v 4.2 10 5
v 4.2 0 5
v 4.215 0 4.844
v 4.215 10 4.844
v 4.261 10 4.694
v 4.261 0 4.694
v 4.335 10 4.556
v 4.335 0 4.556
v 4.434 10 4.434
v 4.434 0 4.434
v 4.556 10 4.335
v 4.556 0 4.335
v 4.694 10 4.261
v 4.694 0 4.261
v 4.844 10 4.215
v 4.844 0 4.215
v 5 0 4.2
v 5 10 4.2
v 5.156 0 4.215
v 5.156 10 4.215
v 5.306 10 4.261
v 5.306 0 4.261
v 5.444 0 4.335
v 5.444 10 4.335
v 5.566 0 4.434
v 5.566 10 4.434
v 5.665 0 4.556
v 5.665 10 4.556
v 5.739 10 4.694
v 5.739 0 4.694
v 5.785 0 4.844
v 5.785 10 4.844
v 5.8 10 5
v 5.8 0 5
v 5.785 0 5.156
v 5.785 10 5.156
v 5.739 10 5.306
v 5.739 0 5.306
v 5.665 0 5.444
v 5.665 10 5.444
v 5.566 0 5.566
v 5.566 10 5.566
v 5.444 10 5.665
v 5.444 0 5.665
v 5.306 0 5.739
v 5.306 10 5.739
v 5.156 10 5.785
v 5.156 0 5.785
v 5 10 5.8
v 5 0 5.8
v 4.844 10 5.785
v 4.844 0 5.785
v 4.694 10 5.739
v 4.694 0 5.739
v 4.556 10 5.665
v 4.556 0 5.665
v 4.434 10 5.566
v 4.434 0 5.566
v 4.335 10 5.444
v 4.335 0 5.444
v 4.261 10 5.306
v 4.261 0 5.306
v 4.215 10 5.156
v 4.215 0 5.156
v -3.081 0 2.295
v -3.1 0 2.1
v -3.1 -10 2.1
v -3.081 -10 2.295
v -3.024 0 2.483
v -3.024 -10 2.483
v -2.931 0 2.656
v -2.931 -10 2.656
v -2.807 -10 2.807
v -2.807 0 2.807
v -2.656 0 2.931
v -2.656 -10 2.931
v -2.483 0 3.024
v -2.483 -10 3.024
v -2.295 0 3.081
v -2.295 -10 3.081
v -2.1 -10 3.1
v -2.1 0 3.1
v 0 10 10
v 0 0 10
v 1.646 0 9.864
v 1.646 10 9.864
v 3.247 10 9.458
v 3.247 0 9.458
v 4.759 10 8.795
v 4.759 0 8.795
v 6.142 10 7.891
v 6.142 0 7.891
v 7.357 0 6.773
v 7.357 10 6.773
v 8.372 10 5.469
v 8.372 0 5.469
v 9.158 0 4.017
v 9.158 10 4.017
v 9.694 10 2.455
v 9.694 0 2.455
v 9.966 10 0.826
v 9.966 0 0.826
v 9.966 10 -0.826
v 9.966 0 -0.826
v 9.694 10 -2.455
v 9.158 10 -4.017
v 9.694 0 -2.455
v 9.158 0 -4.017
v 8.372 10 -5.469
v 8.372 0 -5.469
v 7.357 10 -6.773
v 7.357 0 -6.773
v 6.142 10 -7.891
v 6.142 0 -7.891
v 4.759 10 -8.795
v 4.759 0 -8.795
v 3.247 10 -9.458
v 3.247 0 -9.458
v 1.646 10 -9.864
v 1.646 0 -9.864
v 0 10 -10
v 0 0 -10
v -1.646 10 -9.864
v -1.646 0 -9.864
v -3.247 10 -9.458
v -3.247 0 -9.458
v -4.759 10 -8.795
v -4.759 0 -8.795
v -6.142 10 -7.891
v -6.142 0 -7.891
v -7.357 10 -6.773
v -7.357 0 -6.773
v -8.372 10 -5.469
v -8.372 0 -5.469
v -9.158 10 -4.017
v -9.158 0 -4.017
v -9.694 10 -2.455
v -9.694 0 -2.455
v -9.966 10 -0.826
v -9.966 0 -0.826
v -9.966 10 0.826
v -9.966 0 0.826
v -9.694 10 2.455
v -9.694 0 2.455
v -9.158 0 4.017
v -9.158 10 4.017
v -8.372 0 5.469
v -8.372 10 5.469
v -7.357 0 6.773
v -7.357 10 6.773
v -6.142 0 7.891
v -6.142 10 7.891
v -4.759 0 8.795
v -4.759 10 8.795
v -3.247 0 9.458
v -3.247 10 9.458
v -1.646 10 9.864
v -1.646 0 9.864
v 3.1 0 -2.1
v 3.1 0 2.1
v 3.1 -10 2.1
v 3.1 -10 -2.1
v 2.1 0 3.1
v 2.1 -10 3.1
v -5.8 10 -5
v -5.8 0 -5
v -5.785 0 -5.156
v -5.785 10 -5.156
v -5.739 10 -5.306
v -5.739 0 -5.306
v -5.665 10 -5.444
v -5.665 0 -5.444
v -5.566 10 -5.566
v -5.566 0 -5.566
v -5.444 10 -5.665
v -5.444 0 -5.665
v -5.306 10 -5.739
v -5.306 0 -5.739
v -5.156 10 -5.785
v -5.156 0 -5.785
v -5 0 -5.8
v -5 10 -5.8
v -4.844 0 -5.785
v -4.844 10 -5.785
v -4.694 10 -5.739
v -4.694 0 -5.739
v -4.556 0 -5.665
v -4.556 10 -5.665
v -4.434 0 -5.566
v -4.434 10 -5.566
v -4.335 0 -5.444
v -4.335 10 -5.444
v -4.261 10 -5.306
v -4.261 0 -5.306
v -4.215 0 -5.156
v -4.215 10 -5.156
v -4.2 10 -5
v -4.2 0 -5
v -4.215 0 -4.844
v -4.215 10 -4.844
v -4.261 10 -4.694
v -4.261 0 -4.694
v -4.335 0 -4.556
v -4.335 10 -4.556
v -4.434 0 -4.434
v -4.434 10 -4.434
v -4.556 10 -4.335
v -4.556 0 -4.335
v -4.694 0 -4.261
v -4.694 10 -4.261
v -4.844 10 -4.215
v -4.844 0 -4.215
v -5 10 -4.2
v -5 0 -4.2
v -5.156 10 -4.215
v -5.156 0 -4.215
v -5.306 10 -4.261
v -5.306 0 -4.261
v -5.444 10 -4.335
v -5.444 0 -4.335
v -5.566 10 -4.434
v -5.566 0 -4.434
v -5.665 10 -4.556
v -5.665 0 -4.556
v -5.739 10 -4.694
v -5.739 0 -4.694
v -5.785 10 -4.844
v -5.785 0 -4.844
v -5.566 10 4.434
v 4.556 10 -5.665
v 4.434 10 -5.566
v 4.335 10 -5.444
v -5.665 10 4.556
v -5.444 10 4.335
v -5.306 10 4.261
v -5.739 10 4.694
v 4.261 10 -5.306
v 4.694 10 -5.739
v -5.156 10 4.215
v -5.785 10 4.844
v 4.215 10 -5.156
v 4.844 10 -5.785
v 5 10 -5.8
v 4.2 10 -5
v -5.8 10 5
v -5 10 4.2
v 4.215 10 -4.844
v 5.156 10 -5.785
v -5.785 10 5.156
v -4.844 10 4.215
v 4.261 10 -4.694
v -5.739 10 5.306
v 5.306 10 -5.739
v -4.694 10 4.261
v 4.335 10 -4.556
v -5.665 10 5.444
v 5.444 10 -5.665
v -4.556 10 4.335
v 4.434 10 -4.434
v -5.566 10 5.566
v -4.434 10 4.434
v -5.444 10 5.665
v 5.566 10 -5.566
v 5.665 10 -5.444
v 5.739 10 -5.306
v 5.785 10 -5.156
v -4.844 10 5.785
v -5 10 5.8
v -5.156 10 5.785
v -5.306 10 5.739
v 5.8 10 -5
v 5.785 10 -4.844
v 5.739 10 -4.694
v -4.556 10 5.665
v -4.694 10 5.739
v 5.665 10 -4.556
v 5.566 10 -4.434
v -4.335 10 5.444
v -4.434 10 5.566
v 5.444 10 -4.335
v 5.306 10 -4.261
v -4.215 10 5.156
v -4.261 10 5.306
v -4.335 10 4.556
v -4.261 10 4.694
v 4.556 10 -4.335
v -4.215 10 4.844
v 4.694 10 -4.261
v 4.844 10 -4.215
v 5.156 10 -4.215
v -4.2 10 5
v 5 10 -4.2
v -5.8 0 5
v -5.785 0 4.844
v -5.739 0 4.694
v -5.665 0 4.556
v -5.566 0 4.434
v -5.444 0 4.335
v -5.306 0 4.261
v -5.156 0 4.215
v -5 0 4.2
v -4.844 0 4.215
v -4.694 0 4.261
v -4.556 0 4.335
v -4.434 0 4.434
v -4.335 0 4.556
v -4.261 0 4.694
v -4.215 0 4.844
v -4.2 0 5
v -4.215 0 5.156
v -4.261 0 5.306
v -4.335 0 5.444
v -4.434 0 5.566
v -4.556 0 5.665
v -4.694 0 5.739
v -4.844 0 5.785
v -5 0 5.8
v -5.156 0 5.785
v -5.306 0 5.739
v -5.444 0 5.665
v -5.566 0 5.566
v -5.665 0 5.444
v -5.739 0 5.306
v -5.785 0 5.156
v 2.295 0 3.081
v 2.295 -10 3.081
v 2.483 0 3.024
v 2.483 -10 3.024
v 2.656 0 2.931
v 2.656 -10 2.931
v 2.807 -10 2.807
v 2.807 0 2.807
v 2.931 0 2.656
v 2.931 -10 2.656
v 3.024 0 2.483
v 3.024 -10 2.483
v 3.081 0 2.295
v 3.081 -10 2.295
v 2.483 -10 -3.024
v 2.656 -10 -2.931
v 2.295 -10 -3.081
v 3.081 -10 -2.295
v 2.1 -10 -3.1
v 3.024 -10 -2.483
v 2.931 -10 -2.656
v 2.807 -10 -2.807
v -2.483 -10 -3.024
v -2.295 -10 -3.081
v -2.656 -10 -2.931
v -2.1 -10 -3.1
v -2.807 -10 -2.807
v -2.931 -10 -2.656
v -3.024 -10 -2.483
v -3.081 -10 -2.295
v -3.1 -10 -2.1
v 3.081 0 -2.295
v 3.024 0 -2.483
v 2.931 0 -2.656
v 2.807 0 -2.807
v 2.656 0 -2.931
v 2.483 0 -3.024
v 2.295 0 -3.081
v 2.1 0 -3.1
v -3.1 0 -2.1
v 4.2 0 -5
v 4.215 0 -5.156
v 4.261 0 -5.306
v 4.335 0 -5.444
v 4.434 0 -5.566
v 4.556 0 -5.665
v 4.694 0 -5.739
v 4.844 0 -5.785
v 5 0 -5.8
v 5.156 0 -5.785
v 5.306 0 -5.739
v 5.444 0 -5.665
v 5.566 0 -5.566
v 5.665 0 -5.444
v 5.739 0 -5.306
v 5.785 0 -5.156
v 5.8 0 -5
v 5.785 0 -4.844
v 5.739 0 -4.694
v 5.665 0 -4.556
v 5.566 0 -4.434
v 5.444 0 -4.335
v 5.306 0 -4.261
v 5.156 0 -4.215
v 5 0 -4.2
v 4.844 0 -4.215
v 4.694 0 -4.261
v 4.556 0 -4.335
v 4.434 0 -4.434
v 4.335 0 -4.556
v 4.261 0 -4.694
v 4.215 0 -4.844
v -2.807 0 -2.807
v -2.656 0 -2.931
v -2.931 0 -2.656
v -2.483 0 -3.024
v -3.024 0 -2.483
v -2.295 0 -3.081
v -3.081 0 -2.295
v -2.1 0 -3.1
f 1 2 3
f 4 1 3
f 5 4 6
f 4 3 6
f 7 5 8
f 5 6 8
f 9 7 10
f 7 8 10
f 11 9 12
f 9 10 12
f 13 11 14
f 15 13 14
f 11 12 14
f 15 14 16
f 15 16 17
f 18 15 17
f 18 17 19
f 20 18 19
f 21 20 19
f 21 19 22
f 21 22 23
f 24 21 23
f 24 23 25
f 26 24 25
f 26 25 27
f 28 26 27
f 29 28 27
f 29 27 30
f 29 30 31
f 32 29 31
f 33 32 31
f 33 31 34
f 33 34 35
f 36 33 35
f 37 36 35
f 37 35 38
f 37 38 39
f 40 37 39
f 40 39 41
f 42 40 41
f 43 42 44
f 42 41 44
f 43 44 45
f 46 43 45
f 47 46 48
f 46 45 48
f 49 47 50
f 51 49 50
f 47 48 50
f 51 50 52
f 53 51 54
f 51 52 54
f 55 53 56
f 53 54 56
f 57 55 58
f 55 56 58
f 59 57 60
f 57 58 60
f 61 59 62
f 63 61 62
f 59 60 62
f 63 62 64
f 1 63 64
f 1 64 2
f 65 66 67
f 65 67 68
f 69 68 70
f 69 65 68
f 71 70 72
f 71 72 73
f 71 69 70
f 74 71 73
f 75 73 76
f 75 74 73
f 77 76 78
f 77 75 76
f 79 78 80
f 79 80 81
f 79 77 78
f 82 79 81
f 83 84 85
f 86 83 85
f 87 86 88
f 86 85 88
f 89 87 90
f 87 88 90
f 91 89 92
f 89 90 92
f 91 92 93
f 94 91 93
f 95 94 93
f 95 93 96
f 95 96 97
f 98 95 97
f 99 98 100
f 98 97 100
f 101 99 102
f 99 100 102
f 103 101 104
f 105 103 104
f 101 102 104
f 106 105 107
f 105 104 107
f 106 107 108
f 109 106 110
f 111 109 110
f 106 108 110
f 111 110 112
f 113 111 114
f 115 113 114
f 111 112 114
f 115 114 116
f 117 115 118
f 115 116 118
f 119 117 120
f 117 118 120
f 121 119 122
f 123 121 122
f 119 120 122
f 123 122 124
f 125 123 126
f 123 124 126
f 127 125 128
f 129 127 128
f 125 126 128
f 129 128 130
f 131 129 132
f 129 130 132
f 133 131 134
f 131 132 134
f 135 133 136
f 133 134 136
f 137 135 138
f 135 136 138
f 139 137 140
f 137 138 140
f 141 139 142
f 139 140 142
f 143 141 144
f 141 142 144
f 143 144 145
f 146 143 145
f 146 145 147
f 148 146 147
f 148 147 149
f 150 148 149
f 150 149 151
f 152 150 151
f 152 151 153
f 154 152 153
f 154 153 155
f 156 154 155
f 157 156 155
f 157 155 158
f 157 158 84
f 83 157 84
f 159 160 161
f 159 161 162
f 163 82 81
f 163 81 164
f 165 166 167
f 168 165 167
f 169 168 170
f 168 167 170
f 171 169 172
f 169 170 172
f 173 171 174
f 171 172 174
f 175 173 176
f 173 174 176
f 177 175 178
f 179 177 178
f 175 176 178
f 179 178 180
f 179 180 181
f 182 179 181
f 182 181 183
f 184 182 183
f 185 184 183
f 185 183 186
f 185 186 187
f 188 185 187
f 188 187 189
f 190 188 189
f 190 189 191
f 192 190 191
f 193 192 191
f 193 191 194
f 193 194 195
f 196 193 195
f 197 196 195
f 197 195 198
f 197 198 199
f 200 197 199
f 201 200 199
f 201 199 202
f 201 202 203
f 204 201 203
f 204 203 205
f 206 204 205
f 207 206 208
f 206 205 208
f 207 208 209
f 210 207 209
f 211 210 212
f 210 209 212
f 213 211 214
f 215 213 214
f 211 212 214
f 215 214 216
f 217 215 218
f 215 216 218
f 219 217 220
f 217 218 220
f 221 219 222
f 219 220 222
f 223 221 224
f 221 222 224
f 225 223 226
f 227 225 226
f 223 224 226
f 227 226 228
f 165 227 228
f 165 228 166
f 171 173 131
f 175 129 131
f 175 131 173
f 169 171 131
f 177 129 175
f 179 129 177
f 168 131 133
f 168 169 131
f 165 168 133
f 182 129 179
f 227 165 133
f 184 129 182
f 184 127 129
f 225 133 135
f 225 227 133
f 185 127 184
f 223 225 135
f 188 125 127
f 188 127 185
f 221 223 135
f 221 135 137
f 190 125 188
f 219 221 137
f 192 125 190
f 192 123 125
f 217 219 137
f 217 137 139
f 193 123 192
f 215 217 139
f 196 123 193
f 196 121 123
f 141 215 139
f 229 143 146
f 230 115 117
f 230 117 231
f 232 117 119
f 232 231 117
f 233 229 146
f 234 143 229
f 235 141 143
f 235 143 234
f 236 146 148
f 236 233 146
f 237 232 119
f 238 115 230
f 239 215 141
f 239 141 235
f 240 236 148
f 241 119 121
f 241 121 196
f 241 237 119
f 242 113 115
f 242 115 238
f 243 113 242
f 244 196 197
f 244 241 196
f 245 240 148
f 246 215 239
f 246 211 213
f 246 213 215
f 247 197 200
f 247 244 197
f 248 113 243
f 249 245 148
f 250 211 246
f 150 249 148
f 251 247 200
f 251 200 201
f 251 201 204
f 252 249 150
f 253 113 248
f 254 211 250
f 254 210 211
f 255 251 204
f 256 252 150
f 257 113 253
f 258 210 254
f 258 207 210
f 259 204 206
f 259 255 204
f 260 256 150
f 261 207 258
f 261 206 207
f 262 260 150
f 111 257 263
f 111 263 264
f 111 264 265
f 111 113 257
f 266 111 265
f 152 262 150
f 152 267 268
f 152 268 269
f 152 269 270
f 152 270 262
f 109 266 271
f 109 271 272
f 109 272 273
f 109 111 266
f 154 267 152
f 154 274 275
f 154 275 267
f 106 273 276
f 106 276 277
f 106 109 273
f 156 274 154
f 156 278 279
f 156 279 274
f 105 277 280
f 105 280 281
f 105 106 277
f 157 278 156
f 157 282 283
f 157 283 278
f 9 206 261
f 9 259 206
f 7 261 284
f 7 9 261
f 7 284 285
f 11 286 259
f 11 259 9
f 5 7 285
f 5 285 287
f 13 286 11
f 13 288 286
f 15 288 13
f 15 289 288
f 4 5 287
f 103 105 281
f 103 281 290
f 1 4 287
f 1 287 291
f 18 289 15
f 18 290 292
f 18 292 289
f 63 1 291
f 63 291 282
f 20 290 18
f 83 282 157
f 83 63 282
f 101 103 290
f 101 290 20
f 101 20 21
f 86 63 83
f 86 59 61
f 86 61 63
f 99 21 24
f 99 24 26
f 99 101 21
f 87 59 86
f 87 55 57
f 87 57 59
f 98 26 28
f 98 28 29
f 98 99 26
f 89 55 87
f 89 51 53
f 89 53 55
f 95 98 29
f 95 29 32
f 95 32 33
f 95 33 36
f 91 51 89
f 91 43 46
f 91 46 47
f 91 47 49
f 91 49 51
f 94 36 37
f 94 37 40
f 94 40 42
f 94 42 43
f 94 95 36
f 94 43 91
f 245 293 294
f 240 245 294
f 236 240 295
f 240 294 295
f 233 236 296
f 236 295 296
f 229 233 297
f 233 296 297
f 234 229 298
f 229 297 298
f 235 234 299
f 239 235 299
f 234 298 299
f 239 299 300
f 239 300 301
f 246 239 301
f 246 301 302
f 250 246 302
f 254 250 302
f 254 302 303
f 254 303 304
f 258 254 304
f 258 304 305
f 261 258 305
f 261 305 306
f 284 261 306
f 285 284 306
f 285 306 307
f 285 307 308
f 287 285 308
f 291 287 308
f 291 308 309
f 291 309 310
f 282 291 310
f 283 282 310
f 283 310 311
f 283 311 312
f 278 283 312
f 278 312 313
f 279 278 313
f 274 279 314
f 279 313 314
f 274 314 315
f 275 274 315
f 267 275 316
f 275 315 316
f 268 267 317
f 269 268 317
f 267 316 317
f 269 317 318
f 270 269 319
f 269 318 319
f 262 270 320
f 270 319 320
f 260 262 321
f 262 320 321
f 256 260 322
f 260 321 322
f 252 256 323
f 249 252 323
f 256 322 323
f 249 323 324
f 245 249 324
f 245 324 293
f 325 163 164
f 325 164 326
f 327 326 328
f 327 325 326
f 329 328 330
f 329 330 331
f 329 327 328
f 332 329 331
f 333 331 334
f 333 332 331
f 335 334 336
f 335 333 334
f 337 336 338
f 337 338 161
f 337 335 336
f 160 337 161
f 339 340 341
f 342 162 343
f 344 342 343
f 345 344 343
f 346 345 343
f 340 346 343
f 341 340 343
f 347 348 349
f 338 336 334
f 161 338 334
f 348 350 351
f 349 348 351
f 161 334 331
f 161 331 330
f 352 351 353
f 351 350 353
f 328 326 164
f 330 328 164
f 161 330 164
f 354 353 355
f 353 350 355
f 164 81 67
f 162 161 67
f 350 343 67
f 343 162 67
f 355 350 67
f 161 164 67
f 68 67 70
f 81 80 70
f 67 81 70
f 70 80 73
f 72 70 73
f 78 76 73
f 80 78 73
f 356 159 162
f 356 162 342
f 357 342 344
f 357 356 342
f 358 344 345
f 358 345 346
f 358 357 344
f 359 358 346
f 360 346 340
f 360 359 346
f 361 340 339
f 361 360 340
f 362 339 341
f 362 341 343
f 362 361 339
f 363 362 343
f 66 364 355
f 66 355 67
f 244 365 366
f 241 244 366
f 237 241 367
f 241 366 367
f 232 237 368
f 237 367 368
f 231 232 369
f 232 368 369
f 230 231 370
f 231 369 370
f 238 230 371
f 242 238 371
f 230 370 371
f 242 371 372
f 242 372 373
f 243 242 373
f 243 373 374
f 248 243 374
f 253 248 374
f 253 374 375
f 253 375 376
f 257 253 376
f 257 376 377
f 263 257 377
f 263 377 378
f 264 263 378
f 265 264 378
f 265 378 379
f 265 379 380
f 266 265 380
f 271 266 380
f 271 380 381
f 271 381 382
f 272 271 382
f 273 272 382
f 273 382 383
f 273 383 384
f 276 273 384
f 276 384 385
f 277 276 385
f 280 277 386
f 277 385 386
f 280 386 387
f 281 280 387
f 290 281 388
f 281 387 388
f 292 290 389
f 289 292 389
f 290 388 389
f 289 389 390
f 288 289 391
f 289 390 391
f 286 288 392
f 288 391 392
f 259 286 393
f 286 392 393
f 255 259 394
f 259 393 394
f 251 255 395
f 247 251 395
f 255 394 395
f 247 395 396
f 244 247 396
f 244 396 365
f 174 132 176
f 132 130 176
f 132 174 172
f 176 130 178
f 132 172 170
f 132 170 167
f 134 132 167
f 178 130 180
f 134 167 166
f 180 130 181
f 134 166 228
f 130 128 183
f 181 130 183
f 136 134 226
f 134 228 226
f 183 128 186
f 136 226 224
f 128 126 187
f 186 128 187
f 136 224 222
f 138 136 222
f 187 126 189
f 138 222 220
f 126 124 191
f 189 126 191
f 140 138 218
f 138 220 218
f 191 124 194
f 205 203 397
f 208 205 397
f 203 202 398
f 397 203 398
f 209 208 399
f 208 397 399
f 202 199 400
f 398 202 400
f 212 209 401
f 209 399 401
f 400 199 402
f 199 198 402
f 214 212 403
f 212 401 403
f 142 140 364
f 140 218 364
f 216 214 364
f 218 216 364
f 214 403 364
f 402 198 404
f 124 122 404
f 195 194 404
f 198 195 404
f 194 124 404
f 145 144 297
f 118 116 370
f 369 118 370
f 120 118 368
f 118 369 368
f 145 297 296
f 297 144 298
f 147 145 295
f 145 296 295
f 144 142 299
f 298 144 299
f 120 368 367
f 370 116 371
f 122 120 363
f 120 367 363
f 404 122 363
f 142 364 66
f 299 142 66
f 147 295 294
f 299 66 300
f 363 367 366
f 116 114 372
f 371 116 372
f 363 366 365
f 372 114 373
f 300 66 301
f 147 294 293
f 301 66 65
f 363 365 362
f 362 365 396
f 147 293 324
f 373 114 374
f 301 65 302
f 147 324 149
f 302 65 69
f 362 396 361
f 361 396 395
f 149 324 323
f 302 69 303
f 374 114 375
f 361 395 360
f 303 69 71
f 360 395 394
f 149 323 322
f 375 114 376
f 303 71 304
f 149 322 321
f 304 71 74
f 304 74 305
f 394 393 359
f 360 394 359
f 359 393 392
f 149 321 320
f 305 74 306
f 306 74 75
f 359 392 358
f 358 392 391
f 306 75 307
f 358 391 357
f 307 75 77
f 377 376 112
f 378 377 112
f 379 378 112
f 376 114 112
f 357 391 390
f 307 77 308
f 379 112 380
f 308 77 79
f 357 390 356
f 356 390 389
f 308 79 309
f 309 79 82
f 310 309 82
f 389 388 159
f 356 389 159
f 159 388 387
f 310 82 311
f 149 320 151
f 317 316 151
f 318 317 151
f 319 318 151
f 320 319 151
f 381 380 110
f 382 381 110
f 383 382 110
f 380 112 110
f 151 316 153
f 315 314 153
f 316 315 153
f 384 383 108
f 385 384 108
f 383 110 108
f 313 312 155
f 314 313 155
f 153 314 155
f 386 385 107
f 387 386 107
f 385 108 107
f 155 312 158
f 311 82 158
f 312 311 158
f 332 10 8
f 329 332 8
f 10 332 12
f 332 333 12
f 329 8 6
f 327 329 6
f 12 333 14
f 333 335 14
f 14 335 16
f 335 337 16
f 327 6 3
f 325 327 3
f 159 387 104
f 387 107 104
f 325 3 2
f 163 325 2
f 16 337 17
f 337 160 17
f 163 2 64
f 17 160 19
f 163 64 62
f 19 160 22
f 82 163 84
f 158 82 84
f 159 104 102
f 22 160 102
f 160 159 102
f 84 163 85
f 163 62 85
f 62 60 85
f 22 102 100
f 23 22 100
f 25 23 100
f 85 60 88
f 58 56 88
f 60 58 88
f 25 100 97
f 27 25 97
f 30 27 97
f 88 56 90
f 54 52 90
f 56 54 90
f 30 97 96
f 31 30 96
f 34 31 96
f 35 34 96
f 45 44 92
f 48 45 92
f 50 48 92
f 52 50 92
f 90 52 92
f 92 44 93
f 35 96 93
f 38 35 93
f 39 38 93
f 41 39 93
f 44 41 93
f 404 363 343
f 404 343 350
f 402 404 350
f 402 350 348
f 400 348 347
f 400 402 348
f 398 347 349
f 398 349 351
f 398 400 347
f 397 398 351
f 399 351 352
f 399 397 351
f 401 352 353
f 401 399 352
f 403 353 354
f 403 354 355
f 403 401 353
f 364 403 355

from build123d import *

# Parameters (mm, degrees)
SKETCH1_R             = 10
BOSS_EXTRUDE1_DEPTH   = 10
M2X0_4_TAPPED_HOLE1_D = 1.6
BOSS_EXTRUDE2_DEPTH   = 10


with BuildPart() as part:
    # Sketch1 → Boss-Extrude1 (new body)
    with BuildSketch(Plane(origin=(0, 0, 0), x_dir=(1, 0, 0), z_dir=(0, 1, 0))):
        with Locations(Location((0, 0, 0), (0, 0, 270))):
            Circle(SKETCH1_R)
    extrude(amount=BOSS_EXTRUDE1_DEPTH)

    # M2x0.4 Tapped Hole1 (through all)
    with Locations(Plane(origin=(0, 10, 0), x_dir=(1, 0, 0), z_dir=(0, 1, 0))):
        with Locations((-5, 5), (5, 5), (5, -5), (-5, -5)):
            Hole(M2X0_4_TAPPED_HOLE1_D / 2)

    # Sketch5 → Boss-Extrude2 (add)
    with BuildSketch(Plane.XZ):
        with BuildLine():
            Line((-2.1, 3.1), (2.1, 3.1))
            ThreePointArc((2.1, 3.1), (2.807106781, 2.807106781), (3.1, 2.1))
            Line((3.1, 2.1), (3.1, -2.1))
            ThreePointArc((3.1, -2.1), (2.807106781, -2.807106781), (2.1, -3.1))
            Line((2.1, -3.1), (-2.1, -3.1))
            ThreePointArc((-2.1, -3.1), (-2.807106781, -2.807106781), (-3.1, -2.1))
            Line((-3.1, -2.1), (-3.1, 2.1))
            ThreePointArc((-3.1, 2.1), (-2.807106781, 2.807106781), (-2.1, 3.1))
        make_face()
    extrude(amount=BOSS_EXTRUDE2_DEPTH)


solid = part.part
